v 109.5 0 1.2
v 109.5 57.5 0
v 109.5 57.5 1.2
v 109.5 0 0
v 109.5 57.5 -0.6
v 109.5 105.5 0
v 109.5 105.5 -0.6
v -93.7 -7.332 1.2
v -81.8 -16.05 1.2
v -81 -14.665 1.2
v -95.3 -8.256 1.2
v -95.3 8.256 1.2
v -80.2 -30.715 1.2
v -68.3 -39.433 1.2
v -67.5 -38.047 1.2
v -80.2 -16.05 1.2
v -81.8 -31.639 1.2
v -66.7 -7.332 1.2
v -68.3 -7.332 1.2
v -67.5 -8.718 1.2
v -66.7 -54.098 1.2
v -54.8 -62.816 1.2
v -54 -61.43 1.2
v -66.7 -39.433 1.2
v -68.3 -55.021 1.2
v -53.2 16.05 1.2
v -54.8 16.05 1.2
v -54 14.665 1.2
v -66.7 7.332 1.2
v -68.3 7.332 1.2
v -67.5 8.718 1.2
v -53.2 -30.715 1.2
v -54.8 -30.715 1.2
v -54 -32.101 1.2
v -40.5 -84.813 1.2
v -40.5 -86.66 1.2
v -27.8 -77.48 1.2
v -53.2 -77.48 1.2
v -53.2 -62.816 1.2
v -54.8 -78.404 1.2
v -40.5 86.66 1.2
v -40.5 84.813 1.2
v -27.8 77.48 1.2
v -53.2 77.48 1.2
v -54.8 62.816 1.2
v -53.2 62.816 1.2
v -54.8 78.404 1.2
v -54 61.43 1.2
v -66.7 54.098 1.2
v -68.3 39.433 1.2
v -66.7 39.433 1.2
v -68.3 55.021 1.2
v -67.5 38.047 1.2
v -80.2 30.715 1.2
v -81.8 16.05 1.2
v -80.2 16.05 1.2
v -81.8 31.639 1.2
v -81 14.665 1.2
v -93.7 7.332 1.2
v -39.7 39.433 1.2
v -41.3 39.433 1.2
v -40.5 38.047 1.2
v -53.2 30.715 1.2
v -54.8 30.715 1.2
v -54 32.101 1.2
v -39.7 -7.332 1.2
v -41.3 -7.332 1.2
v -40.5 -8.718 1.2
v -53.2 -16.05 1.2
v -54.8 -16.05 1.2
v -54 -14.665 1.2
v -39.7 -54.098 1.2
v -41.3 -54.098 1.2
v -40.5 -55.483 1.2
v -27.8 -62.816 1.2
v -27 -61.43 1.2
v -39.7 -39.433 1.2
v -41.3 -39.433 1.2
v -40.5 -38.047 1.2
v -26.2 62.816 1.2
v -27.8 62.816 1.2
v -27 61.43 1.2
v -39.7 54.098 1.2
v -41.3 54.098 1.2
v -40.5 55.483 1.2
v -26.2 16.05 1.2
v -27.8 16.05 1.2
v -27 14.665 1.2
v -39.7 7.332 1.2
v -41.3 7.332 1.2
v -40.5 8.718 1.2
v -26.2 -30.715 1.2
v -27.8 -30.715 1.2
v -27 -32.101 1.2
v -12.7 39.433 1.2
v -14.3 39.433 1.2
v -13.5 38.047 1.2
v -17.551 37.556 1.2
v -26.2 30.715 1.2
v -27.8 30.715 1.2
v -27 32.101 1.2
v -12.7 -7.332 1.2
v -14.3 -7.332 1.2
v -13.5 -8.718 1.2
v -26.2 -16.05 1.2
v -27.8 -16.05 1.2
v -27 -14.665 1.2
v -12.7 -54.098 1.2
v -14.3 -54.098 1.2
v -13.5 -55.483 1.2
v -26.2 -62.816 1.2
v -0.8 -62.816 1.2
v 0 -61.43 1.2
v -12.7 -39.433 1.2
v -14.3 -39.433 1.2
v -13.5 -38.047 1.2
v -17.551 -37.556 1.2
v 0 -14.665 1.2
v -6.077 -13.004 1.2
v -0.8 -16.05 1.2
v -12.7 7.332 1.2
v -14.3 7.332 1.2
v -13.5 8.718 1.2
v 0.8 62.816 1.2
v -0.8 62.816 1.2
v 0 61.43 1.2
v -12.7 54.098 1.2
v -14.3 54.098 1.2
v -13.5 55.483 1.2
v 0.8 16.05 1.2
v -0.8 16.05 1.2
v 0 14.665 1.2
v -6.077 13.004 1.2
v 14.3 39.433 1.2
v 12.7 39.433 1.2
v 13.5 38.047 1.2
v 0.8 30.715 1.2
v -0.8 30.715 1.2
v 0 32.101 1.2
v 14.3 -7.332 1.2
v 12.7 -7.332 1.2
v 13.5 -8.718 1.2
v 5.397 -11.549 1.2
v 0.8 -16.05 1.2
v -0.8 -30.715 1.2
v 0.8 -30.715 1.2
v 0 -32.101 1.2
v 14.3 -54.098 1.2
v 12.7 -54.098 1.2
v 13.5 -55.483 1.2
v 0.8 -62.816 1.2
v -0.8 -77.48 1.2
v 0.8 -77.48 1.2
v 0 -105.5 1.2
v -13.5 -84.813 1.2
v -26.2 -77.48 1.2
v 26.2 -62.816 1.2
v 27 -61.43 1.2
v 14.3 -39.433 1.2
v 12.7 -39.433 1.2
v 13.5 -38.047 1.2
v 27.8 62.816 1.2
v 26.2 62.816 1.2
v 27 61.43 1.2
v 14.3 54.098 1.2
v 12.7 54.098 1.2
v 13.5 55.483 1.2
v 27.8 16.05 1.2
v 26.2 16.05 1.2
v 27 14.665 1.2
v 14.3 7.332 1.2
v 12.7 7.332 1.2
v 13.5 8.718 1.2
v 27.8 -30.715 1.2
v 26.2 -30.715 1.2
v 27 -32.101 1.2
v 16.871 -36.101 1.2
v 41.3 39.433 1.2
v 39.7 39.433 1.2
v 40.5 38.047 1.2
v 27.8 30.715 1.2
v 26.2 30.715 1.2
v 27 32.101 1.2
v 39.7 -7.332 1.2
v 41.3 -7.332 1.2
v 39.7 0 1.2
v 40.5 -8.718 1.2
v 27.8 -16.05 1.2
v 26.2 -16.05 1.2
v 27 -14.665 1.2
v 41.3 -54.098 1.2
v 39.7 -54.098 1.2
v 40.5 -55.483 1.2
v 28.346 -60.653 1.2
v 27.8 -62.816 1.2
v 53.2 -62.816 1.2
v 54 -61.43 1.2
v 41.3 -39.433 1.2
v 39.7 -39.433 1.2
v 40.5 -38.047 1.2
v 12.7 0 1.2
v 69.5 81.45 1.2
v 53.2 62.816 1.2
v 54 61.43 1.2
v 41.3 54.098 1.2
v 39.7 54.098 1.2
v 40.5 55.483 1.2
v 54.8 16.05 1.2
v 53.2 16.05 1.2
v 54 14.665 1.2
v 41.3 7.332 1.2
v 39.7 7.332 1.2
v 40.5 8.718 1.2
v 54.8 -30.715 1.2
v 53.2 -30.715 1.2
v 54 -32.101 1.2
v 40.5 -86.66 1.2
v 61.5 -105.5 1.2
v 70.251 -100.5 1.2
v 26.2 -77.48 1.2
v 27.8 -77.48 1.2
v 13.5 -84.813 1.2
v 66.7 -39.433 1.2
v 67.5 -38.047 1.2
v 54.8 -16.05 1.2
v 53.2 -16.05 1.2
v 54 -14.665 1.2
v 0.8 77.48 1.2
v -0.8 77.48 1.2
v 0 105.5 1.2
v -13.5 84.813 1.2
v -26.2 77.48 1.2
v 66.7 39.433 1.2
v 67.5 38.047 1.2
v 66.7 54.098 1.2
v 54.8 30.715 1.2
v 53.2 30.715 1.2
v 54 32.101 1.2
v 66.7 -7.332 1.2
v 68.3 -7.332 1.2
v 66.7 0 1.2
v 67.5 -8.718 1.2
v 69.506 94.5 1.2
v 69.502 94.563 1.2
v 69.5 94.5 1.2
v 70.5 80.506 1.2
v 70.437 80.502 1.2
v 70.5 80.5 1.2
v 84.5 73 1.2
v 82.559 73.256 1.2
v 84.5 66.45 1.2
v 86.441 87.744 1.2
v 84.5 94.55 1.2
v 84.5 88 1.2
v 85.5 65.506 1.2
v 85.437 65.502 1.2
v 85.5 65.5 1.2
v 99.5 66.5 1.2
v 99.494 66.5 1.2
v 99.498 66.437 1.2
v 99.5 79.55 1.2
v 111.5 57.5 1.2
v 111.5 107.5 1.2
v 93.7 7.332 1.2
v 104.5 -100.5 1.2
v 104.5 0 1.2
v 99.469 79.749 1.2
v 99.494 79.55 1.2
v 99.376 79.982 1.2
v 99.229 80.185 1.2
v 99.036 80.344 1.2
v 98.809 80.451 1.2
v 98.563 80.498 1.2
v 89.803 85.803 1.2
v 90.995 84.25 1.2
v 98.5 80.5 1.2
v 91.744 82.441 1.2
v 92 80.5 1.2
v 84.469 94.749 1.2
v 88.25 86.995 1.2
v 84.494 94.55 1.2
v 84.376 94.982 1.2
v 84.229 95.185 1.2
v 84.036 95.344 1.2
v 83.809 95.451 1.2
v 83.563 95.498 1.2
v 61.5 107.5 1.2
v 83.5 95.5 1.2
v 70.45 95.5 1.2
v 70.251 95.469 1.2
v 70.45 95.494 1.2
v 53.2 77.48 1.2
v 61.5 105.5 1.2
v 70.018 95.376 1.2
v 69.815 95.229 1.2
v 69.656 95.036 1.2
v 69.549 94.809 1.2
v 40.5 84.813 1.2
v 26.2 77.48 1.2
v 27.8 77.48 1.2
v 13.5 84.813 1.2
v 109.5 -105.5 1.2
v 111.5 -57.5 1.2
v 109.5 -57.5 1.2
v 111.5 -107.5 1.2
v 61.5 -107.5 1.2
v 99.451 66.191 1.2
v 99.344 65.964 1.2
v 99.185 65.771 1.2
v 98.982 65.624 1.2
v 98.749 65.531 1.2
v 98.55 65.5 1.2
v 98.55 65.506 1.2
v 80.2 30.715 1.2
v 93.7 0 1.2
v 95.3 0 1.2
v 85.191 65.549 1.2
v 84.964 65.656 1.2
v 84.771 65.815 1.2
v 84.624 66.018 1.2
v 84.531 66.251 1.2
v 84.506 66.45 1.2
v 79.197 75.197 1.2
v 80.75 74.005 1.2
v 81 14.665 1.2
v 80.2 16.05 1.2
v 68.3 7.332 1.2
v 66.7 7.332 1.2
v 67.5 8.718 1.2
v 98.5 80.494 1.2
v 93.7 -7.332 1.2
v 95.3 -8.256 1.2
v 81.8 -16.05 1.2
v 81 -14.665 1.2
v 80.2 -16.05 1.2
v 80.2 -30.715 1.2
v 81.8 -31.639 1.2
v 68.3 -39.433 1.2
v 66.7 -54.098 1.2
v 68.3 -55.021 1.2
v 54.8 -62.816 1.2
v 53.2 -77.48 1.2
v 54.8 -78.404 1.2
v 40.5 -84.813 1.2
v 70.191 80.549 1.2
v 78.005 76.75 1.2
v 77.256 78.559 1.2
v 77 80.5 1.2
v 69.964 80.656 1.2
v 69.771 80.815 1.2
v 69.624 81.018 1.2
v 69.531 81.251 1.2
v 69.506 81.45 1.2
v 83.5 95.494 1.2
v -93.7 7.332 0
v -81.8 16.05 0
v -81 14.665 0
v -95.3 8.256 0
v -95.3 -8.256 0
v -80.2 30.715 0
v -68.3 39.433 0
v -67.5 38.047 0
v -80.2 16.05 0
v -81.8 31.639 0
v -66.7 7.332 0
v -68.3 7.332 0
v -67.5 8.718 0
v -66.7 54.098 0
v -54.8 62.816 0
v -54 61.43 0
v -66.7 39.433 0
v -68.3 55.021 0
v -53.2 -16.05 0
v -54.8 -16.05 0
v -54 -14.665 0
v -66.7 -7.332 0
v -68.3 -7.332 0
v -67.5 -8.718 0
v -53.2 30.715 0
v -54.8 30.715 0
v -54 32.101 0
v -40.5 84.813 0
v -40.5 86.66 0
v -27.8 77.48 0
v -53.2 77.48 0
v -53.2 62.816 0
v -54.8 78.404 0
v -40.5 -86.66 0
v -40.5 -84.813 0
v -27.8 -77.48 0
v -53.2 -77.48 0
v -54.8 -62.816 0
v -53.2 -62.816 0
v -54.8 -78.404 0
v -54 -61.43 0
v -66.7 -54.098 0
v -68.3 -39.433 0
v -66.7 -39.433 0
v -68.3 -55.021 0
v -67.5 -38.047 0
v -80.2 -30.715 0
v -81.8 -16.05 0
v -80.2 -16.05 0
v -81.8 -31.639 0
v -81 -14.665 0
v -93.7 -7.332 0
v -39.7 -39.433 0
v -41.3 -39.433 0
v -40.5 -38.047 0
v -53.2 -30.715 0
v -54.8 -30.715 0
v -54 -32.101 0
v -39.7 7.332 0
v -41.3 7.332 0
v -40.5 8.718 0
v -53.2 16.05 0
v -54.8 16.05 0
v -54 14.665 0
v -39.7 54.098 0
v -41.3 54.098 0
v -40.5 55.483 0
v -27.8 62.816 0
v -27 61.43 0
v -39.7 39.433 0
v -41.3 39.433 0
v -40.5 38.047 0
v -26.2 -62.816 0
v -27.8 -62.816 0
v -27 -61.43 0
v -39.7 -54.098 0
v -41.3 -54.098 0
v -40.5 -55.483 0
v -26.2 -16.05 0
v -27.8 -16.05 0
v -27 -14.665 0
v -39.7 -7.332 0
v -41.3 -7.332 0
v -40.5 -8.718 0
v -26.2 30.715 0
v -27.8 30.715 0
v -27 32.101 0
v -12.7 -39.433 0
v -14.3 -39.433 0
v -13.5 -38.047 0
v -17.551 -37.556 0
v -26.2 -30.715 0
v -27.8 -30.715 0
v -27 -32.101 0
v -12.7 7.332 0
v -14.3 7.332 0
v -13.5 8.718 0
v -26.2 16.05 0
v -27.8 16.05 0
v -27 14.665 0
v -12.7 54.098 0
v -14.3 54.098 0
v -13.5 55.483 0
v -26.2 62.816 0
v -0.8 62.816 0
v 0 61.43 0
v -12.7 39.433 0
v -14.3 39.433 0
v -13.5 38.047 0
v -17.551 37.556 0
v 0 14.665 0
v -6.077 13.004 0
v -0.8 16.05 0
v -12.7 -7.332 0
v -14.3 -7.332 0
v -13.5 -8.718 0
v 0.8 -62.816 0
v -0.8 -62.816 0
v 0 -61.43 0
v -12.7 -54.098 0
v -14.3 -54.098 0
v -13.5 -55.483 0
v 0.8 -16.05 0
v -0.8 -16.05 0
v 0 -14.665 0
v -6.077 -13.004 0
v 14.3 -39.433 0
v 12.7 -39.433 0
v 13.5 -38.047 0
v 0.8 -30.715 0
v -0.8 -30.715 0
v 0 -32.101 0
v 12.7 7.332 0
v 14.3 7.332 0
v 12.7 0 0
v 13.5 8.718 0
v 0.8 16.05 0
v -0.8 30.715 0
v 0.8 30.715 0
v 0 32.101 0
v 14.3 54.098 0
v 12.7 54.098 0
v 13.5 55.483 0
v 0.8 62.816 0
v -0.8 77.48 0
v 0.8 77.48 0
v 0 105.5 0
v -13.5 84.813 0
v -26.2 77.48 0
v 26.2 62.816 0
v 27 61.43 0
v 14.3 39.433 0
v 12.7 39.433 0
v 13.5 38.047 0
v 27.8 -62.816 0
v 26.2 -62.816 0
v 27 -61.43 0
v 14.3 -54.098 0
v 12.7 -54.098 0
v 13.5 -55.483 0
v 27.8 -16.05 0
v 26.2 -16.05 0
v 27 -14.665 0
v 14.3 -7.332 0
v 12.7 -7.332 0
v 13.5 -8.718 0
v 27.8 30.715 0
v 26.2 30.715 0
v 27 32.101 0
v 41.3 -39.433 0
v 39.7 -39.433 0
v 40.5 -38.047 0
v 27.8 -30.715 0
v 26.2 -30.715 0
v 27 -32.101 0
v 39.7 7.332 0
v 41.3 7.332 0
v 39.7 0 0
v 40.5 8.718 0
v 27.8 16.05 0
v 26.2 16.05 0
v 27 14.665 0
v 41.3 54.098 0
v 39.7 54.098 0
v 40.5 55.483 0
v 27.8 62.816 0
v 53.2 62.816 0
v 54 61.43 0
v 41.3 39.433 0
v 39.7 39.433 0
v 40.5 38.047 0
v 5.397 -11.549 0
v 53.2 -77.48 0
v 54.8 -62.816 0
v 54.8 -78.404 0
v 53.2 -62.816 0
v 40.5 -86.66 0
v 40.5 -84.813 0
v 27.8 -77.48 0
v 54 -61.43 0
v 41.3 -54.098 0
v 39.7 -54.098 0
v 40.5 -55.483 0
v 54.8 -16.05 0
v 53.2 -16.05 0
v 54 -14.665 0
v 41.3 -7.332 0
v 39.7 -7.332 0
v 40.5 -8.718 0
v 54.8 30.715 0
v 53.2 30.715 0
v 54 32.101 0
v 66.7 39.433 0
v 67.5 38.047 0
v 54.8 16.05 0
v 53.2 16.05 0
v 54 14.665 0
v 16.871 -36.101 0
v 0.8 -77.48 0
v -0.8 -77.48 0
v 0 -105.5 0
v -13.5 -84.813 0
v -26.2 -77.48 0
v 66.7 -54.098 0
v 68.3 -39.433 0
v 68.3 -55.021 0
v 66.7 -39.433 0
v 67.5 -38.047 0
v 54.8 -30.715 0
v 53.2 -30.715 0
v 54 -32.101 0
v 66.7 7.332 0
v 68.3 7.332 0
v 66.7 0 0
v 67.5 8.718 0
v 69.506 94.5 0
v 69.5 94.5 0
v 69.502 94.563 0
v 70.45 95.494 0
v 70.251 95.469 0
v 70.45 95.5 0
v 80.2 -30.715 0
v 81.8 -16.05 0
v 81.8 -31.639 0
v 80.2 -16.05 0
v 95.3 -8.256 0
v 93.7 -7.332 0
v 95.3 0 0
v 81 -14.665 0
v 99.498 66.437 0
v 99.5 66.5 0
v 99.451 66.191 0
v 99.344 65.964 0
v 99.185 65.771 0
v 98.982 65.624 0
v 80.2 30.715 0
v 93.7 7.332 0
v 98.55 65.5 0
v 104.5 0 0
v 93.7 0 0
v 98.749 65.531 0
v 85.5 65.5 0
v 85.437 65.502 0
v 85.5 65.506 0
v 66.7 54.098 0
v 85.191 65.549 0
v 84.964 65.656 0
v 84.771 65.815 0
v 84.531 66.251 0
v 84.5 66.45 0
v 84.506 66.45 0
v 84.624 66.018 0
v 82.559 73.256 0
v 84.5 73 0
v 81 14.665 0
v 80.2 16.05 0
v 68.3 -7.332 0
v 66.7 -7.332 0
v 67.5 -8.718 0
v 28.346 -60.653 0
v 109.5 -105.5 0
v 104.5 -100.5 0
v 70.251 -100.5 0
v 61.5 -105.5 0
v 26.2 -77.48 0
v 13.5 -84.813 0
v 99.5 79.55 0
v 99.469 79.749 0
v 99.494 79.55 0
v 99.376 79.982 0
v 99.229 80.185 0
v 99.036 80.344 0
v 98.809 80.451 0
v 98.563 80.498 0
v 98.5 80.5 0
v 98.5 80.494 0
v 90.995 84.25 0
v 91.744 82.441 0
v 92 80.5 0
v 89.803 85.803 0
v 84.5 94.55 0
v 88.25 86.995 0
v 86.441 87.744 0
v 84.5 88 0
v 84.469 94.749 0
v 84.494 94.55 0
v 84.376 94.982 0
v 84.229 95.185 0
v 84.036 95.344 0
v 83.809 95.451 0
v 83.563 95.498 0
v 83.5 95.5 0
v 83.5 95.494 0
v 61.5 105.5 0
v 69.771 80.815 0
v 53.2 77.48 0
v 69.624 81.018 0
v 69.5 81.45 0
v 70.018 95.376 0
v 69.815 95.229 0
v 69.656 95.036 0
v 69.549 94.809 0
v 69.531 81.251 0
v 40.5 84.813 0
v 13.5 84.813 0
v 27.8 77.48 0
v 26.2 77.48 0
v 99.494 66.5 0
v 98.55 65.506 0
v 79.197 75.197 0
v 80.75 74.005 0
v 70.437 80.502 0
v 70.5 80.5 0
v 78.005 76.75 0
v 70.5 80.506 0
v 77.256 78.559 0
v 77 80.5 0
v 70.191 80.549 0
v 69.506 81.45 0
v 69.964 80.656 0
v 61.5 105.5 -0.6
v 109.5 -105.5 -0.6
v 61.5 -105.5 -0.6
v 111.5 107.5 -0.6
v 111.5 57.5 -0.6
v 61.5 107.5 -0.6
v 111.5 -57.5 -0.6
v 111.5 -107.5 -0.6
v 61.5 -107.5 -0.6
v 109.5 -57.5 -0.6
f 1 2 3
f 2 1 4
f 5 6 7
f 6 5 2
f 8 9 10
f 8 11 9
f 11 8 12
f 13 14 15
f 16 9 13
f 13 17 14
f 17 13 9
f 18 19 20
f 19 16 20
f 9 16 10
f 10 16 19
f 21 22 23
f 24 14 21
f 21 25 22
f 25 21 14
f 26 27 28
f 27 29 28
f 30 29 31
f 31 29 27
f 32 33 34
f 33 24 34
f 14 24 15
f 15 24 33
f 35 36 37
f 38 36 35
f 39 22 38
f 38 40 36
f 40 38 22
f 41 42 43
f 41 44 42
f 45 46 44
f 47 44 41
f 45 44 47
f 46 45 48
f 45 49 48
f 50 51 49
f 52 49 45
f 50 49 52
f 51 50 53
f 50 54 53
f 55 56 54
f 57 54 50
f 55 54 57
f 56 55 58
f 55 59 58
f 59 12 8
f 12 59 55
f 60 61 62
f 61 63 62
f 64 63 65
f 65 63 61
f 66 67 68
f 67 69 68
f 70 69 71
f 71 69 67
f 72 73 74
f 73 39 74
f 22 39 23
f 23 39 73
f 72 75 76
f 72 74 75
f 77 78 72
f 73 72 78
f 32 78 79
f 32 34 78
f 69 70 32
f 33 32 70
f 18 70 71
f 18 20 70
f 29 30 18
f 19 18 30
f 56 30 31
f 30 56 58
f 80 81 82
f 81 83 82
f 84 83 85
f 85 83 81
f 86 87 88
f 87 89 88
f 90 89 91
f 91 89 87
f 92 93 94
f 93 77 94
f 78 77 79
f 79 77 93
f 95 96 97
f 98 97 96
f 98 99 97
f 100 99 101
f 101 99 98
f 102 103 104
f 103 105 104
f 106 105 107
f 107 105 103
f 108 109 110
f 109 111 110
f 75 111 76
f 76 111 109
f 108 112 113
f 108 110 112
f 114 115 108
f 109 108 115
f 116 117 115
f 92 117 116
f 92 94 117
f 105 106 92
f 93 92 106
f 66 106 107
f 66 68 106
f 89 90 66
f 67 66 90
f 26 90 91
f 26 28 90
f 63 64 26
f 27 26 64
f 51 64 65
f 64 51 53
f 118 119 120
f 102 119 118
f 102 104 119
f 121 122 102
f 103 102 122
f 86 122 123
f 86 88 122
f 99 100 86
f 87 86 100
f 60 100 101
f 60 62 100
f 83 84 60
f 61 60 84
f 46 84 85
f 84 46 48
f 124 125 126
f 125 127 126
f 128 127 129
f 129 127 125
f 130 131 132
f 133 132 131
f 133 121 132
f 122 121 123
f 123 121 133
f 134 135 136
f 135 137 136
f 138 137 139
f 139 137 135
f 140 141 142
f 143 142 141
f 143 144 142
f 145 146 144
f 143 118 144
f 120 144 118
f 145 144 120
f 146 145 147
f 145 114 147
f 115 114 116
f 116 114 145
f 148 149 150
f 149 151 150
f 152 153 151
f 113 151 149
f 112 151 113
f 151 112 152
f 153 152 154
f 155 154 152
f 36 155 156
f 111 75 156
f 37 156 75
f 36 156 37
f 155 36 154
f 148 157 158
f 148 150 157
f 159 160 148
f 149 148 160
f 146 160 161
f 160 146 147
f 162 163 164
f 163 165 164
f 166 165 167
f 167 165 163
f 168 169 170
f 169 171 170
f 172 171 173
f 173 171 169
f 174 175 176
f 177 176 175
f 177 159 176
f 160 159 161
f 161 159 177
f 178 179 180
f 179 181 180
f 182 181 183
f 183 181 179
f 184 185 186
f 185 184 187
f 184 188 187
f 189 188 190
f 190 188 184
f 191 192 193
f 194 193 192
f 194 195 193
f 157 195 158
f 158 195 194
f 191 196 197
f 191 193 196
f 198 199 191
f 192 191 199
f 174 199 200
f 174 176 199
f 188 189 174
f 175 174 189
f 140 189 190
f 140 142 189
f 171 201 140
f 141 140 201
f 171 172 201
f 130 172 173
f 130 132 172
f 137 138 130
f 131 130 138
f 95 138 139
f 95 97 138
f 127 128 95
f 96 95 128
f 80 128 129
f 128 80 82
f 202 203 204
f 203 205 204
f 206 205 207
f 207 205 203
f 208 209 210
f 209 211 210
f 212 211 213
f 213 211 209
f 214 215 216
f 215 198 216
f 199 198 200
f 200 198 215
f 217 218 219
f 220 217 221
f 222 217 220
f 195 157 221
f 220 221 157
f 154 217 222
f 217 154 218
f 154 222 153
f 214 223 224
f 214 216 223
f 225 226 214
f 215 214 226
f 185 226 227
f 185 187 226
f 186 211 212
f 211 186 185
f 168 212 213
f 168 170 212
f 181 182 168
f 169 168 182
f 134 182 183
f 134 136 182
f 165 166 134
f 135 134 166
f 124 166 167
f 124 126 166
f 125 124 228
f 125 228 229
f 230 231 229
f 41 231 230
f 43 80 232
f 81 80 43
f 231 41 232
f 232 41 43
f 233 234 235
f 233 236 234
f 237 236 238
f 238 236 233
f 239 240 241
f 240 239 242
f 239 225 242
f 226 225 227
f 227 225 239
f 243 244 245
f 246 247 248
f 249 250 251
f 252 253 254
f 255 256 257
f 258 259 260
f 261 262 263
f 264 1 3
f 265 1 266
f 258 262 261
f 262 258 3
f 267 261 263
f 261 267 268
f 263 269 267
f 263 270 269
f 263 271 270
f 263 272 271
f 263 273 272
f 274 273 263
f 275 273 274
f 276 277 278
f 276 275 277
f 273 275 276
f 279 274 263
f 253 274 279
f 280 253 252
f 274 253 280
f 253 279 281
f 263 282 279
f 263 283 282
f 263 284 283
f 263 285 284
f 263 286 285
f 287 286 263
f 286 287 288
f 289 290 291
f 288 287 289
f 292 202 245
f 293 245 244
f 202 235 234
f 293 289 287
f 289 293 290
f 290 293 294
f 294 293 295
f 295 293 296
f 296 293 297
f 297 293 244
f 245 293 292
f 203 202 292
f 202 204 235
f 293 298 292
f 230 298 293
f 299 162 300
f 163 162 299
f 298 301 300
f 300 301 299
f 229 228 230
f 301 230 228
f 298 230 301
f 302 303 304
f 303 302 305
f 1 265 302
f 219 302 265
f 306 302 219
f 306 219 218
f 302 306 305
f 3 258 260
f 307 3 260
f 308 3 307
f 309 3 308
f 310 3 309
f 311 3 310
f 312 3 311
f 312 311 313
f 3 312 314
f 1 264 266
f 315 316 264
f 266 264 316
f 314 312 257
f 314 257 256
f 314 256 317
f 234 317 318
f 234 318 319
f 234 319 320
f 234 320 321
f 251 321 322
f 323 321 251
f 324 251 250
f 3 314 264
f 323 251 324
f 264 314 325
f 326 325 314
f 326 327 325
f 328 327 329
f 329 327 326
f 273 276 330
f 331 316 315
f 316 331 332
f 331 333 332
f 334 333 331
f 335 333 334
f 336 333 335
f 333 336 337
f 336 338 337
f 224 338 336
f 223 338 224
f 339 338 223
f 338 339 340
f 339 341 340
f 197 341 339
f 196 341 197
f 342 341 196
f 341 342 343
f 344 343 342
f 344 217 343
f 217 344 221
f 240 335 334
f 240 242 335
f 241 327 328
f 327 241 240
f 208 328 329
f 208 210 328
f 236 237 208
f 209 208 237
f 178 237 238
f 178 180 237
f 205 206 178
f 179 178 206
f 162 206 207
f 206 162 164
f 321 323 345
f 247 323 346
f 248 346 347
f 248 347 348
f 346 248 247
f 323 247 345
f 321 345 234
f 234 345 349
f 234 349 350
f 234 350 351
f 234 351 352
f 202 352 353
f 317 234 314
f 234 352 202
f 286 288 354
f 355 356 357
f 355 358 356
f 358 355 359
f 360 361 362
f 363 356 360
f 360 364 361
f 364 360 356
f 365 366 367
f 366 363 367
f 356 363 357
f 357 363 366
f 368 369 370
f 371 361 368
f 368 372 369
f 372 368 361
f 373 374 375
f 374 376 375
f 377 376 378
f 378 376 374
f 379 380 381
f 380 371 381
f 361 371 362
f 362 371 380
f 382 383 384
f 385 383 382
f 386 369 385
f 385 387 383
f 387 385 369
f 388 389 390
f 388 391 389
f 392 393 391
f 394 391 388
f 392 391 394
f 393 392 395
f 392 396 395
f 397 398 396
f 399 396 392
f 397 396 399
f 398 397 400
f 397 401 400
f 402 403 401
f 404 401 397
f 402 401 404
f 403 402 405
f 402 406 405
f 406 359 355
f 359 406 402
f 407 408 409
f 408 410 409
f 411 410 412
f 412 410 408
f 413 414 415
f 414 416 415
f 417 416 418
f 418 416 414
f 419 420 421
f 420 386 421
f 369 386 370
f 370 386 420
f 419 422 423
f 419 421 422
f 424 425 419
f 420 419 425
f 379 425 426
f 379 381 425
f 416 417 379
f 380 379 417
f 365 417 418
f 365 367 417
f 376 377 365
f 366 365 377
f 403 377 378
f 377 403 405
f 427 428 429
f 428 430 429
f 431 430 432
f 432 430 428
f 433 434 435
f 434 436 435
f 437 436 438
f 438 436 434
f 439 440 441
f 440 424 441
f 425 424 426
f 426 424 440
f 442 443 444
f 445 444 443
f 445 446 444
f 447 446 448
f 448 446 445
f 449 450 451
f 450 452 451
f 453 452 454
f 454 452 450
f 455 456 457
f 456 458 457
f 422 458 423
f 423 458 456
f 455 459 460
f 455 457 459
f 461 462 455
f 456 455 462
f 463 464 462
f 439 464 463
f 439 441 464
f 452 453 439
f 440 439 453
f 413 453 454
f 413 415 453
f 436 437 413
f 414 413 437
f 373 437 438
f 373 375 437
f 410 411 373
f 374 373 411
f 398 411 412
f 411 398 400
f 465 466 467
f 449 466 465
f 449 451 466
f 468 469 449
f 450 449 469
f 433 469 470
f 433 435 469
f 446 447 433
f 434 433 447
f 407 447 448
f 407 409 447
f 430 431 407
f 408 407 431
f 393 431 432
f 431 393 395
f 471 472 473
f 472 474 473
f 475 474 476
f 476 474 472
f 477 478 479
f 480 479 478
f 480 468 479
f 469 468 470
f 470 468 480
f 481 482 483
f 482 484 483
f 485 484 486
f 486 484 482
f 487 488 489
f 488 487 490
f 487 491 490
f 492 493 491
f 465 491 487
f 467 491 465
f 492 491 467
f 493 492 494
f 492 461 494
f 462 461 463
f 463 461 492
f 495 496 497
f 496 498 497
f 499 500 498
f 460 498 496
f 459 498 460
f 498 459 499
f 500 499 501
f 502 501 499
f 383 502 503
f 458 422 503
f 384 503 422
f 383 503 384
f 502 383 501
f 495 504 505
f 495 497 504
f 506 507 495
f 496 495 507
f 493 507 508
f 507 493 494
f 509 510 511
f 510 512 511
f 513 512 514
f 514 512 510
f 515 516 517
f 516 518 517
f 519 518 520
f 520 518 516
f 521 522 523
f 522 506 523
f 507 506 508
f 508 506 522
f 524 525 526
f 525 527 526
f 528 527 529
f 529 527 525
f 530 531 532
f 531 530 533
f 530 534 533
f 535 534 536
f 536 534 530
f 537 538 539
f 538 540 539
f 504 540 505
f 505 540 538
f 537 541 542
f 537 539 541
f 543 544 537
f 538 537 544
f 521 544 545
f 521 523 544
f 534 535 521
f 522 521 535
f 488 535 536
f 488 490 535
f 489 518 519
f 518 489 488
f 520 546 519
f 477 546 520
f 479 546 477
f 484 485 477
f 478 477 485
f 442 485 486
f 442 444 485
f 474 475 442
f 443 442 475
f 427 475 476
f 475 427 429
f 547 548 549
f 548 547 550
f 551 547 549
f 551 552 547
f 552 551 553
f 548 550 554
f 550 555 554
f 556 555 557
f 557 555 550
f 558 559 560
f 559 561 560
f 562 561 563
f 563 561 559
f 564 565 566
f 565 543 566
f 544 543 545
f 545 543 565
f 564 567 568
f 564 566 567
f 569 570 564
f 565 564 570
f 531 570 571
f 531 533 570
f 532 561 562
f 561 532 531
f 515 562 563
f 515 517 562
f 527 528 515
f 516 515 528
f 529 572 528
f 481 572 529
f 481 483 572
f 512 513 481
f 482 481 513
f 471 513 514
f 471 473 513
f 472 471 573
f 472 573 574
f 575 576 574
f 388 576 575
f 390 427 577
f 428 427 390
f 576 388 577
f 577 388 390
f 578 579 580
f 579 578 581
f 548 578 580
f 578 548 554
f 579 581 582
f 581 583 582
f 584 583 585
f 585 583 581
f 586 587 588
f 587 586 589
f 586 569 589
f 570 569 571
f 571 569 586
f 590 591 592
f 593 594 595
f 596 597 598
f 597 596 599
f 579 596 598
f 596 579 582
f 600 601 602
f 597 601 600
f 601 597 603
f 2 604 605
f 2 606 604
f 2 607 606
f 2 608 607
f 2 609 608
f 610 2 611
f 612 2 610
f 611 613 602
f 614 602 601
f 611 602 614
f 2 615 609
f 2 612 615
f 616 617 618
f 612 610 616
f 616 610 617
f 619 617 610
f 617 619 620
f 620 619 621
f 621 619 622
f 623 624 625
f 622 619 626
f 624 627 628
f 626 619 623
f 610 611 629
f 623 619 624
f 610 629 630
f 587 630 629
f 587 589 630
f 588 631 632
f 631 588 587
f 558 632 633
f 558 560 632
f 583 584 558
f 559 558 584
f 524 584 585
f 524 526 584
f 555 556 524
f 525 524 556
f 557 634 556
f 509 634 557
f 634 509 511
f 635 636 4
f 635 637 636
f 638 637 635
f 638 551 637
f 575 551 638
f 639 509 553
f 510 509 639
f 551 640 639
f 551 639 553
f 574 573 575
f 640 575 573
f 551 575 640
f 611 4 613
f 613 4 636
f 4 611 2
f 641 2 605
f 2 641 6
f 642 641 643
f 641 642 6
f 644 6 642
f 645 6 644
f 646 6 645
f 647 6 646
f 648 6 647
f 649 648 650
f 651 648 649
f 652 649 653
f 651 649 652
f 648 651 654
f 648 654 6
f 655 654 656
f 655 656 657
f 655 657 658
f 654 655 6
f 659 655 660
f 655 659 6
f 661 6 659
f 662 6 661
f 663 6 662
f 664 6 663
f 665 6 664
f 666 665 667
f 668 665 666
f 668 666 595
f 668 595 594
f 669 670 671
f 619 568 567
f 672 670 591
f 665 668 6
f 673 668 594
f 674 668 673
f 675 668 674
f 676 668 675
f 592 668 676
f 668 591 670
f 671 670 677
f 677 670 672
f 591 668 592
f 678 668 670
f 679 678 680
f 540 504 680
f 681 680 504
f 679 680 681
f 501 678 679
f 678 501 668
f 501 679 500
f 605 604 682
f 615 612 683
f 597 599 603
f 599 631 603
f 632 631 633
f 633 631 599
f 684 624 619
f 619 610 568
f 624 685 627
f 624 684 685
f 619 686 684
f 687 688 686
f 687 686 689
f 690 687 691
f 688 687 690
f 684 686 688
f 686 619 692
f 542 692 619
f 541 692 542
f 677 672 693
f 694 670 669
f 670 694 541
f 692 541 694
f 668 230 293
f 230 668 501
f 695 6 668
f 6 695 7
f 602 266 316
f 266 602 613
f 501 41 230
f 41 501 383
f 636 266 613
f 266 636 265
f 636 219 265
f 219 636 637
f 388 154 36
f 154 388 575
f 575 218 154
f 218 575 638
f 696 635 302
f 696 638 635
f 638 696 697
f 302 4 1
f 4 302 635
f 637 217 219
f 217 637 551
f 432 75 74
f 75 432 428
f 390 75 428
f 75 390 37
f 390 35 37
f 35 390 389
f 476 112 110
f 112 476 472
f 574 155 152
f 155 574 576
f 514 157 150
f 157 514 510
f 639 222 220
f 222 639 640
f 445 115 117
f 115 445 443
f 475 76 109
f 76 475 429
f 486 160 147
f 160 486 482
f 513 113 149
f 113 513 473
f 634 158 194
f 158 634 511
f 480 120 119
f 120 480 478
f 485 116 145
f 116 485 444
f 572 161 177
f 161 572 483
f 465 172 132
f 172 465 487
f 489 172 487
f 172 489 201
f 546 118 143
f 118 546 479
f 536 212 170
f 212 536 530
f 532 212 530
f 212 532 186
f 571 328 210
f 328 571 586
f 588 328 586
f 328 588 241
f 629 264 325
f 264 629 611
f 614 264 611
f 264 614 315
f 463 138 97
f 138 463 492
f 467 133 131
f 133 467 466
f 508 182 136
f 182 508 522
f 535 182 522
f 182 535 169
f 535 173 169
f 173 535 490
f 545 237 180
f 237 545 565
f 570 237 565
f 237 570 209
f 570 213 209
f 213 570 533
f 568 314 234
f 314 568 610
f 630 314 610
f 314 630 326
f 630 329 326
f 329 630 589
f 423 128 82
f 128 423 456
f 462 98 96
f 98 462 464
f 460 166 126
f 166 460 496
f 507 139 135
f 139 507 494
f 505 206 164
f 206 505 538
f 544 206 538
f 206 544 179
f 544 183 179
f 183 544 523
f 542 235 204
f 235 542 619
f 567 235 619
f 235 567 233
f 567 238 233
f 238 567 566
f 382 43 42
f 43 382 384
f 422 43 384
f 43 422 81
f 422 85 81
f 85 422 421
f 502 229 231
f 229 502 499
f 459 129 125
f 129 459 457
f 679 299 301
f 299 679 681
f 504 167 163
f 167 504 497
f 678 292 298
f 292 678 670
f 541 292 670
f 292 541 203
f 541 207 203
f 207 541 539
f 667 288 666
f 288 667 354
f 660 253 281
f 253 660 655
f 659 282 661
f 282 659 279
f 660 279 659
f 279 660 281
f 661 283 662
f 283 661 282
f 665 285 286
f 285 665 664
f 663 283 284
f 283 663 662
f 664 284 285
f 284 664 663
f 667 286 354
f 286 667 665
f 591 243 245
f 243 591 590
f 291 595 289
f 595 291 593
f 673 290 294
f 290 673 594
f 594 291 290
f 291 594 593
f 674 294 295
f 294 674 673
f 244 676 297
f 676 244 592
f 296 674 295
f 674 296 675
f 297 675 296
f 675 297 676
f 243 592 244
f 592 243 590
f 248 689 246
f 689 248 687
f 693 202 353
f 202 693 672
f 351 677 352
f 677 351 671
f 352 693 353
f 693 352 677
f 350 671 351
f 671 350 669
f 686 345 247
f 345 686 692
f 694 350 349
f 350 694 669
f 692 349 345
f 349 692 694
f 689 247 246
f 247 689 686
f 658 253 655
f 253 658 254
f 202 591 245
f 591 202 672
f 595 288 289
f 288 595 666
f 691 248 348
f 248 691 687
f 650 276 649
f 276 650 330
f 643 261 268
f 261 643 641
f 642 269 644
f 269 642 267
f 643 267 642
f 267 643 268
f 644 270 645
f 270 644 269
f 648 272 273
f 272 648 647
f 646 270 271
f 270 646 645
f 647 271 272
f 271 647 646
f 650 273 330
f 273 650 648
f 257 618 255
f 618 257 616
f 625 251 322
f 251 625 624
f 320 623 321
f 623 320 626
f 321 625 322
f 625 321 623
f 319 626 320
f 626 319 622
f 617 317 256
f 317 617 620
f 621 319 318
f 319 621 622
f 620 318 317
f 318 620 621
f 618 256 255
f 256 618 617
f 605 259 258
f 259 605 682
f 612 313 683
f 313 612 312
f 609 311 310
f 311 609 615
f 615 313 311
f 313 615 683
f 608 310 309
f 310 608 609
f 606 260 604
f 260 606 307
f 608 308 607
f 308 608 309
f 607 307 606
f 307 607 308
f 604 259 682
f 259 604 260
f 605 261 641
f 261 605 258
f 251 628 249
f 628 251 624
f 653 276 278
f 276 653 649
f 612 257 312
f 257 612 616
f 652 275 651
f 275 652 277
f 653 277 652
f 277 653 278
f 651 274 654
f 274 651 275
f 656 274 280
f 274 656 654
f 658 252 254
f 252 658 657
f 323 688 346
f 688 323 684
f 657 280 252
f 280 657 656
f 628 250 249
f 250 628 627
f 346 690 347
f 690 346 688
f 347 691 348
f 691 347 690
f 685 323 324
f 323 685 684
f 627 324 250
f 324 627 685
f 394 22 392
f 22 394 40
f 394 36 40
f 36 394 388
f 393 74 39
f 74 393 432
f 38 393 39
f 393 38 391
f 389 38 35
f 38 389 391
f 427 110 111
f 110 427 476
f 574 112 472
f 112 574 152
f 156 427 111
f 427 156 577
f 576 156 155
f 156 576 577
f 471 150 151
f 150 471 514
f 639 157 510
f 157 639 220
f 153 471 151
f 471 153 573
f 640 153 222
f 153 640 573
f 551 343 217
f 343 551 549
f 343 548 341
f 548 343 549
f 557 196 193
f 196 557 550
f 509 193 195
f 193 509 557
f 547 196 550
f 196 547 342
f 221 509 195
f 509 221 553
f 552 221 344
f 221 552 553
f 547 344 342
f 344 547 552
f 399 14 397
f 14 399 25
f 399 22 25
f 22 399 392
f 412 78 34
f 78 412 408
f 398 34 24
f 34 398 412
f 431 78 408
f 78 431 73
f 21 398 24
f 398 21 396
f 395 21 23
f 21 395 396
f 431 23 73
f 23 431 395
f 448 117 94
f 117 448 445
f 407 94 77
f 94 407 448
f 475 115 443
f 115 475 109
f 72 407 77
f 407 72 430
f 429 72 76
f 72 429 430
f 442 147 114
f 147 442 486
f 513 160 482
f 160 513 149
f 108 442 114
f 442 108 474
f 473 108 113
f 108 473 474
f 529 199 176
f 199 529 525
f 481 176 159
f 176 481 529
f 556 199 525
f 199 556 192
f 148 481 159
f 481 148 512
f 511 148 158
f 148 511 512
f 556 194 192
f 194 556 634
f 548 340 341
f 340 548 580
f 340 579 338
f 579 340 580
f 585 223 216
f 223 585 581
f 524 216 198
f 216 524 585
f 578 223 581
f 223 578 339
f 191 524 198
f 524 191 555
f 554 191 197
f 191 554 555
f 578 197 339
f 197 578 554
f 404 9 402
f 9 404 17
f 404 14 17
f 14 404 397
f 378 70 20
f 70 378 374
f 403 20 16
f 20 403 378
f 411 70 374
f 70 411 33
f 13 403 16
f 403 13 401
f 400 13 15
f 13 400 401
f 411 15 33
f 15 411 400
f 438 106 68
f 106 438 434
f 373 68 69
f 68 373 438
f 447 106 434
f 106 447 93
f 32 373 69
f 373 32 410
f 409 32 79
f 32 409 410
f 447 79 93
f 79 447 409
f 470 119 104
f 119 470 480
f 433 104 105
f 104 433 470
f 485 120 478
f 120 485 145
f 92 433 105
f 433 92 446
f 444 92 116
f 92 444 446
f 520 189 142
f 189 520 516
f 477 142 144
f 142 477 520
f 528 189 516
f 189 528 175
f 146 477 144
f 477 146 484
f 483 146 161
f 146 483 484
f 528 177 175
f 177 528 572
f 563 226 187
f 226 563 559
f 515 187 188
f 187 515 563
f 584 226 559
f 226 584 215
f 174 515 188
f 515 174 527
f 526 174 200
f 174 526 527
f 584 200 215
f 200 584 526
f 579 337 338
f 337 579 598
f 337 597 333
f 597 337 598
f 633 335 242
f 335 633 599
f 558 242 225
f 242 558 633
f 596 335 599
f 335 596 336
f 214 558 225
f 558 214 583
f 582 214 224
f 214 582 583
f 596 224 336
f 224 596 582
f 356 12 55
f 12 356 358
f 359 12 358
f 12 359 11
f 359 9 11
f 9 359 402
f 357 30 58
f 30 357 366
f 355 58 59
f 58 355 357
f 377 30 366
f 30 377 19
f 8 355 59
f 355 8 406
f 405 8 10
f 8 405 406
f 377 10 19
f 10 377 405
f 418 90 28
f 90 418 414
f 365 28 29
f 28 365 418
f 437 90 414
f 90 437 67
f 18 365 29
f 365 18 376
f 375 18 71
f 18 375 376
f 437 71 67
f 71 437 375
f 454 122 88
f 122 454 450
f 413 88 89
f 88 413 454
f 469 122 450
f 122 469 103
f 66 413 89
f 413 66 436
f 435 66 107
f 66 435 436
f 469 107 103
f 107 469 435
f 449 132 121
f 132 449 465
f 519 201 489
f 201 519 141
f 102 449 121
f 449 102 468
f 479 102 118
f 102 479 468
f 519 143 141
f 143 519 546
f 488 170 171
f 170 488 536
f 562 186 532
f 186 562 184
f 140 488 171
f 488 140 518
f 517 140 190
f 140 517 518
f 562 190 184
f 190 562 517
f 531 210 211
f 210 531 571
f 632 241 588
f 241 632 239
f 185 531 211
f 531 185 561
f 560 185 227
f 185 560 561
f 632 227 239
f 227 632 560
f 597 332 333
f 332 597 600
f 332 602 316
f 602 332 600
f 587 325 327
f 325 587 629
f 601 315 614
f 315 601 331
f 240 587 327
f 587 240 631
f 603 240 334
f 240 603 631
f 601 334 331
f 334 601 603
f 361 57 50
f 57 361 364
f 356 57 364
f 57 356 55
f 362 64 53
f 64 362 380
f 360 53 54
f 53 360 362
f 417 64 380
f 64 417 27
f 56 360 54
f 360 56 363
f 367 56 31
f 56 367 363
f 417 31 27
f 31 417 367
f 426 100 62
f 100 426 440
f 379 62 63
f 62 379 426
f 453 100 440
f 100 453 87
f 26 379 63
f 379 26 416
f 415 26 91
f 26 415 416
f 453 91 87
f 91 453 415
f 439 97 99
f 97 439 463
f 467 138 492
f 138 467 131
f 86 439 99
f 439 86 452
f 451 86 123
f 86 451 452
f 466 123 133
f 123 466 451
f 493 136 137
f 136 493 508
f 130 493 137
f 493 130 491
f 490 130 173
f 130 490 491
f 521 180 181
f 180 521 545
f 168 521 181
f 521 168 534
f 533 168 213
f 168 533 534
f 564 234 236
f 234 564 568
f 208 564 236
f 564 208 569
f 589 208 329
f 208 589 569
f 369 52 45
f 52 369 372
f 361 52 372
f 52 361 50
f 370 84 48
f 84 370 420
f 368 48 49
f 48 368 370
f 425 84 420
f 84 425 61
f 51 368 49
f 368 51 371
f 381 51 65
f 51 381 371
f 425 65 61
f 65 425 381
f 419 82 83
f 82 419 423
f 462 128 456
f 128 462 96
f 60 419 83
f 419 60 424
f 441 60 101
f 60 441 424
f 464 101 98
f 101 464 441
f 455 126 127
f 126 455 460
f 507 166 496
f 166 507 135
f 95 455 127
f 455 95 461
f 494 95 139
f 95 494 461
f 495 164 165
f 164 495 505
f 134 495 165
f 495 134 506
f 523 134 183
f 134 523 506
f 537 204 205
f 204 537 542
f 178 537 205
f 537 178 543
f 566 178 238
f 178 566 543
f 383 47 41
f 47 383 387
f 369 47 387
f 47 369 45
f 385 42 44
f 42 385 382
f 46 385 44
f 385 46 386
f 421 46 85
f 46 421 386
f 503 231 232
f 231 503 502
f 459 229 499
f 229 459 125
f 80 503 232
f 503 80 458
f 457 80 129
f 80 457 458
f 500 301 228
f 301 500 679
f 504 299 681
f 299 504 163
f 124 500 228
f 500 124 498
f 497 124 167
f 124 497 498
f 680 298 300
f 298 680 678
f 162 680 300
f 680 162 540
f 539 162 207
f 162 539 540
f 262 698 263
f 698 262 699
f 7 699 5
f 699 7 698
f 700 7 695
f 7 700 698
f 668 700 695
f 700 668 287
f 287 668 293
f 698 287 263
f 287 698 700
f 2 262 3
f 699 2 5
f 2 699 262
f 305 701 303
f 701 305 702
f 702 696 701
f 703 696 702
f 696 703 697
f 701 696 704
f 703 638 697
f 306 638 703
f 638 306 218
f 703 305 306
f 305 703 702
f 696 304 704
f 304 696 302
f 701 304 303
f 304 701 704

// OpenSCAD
THICKNESS = 1.2;

TOTAL_HEX_EDGE_WITH = 27;
HEX_EDGE = 1.6;
HEX_WIDTH = TOTAL_HEX_EDGE_WITH - HEX_EDGE;  // The size to allow for the hex

HEXi_r = HEX_WIDTH/2;
HEXi_R = HEXi_r/cos(30);
HEXo_r = HEX_WIDTH/2 + HEX_EDGE;
HEXo_R = HEXo_r/cos(30);

SIDE_STEP = HEXo_r*2 - HEX_EDGE;
UP_STEP = HEXo_R*(cos(60))+HEXo_R-HEX_EDGE*cos(30);

EDGE_TO_HEX = 15;
TOP_TO_HEX = 19;

EDGE_TO_CENTRE = EDGE_TO_HEX + SIDE_STEP * 3.5;

CUBE_WIDTH = EDGE_TO_CENTRE + SIDE_STEP * 3.5;

TOTAL_HEIGHT = 211; // Height of the actual player mat
HALF_HEIGHT = TOTAL_HEIGHT/2;

DIE_AREA_DIA = 30;
DIE_AREA_TO_EDGE = 10;

DIE_WIDTH = 15;
DIE_CORNER_RADIUS = 1;

BOARD_THICKNESS = 0.6; // Actual thickness of mat: 0.33mm;
BORDER_OVERHANG = 2;

difference() {
    union() {
        translate([0, , 0]) cube([EDGE_TO_CENTRE, HALF_HEIGHT, THICKNESS]);
        linear_extrude(THICKNESS) polygon(points=[[-SIDE_STEP * 1.5, UP_STEP * 3 + HEXo_R],
    [0, HALF_HEIGHT],
    [0,0]]);
        
        linear_extrude(THICKNESS) polygon(points=[[-SIDE_STEP * 1.5, -(UP_STEP * 3 + HEXo_R)],
    [0, -HALF_HEIGHT],
    [EDGE_TO_CENTRE, -HALF_HEIGHT],
    [EDGE_TO_CENTRE, 0],
    [EDGE_TO_CENTRE-5, 0],
    [EDGE_TO_CENTRE-5, -HALF_HEIGHT+5],
    [0, -HALF_HEIGHT+5],
    [0, 0],]);
       
         linear_extrude(THICKNESS) polygon(points=[
        [SIDE_STEP * 1.5, -(UP_STEP * 3 + HEXo_R)],
    [SIDE_STEP * 3, -HALF_HEIGHT],
    [0, -HALF_HEIGHT+5],
    [0, 0],]);
    }
    
    hexes();
    
    translate([EDGE_TO_CENTRE-DIE_AREA_TO_EDGE-DIE_AREA_DIA/2, HALF_HEIGHT-DIE_AREA_TO_EDGE-DIE_AREA_DIA/2, -0.1]) {
        translate([-DIE_WIDTH/2, DIE_WIDTH/2, 0]) roundCornersCube(DIE_WIDTH, DIE_WIDTH, THICKNESS*4, DIE_CORNER_RADIUS);
        translate([DIE_WIDTH/2, -DIE_WIDTH/2, 0]) roundCornersCube(DIE_WIDTH, DIE_WIDTH, THICKNESS*4, DIE_CORNER_RADIUS);
        cylinder(d=DIE_WIDTH, h=THICKNESS*4);
    }
}
hexes(dogrid=true);

translate([EDGE_TO_CENTRE-50+BORDER_OVERHANG, HALF_HEIGHT, -BOARD_THICKNESS]) cube([50, BORDER_OVERHANG, THICKNESS + BOARD_THICKNESS]);
translate([EDGE_TO_CENTRE, HALF_HEIGHT-50+BORDER_OVERHANG, -BOARD_THICKNESS]) cube([BORDER_OVERHANG, 50, THICKNESS + BOARD_THICKNESS]);
translate([EDGE_TO_CENTRE-50+BORDER_OVERHANG, -HALF_HEIGHT-BORDER_OVERHANG, -BOARD_THICKNESS]) cube([50, BORDER_OVERHANG, THICKNESS + BOARD_THICKNESS]);
translate([EDGE_TO_CENTRE, -HALF_HEIGHT-BORDER_OVERHANG, -BOARD_THICKNESS]) cube([BORDER_OVERHANG, 50, THICKNESS + BOARD_THICKNESS]);

echo("Height", HALF_HEIGHT*2 + BORDER_OVERHANG*2);
echo("Width", EDGE_TO_CENTRE + SIDE_STEP * 3.5);

module hexes(dogrid=false) {
    for(y = [-3 : 3]) {
        count = 7 - abs(y);
        translate([-SIDE_STEP * (count-1) / 2, UP_STEP * y, 0]) hexline(count, dogrid);
    }
}

module hexline(count, dogrid) {
    for(x = [0:count-1]) {
        translate([x * SIDE_STEP, 0, 0]) {
            if (dogrid) {
                hexgrid();
            } else {
                hex();
            }
        }
    }
}

module hex() {
    translate([0, 0, -THICKNESS/2]) linear_extrude(THICKNESS*2) hexploygon(HEXi_r, HEXi_R);
}

module hexgrid() {
    difference() {
        linear_extrude(THICKNESS) hexploygon(HEXo_r, HEXo_R);
        translate([0, 0, -THICKNESS/2]) linear_extrude(THICKNESS*2) hexploygon(HEXi_r, HEXi_R);
    }
}

module hexploygon(r, R) {
    polygon(points=[[-r, -R/2],[-r, R/2],[0, R],[r, R/2],
        [r, -R/2], [0, -R],[-r, -R/2],]);
}

// From: https://www.thingiverse.com/thing:8812/#files
module createMeniscus(h,radius) // This module creates the shape that needs to be substracted from a cube to make its corners rounded.
difference(){        //This shape is basicly the difference between a quarter of cylinder and a cube
   translate([radius/2+0.1,radius/2+0.1,0]){
      cube([radius+0.2,radius+0.1,h+0.2],center=true);         // All that 0.x numbers are to avoid "ghost boundaries" when substracting
   }

   cylinder(h=h+0.2,r=radius,$fn = 25,center=true);
}


module roundCornersCube(x,y,z,r)  // Now we just substract the shape we have created in the four corners
    difference(){
       cube([x,y,z], center=true);

    translate([x/2-r,y/2-r]){  // We move to the first corner (x,y)
          rotate(0){  
             createMeniscus(z,r); // And substract the meniscus
          }
       }
       translate([-x/2+r,y/2-r]){ // To the second corner (-x,y)
          rotate(90){
             createMeniscus(z,r); // But this time we have to rotate the meniscus 90 deg
          }
       }
          translate([-x/2+r,-y/2+r]){ // ... 
          rotate(180){
             createMeniscus(z,r);
          }
       }
          translate([x/2-r,-y/2+r]){
          rotate(270){
             createMeniscus(z,r);
          }
       }
}
